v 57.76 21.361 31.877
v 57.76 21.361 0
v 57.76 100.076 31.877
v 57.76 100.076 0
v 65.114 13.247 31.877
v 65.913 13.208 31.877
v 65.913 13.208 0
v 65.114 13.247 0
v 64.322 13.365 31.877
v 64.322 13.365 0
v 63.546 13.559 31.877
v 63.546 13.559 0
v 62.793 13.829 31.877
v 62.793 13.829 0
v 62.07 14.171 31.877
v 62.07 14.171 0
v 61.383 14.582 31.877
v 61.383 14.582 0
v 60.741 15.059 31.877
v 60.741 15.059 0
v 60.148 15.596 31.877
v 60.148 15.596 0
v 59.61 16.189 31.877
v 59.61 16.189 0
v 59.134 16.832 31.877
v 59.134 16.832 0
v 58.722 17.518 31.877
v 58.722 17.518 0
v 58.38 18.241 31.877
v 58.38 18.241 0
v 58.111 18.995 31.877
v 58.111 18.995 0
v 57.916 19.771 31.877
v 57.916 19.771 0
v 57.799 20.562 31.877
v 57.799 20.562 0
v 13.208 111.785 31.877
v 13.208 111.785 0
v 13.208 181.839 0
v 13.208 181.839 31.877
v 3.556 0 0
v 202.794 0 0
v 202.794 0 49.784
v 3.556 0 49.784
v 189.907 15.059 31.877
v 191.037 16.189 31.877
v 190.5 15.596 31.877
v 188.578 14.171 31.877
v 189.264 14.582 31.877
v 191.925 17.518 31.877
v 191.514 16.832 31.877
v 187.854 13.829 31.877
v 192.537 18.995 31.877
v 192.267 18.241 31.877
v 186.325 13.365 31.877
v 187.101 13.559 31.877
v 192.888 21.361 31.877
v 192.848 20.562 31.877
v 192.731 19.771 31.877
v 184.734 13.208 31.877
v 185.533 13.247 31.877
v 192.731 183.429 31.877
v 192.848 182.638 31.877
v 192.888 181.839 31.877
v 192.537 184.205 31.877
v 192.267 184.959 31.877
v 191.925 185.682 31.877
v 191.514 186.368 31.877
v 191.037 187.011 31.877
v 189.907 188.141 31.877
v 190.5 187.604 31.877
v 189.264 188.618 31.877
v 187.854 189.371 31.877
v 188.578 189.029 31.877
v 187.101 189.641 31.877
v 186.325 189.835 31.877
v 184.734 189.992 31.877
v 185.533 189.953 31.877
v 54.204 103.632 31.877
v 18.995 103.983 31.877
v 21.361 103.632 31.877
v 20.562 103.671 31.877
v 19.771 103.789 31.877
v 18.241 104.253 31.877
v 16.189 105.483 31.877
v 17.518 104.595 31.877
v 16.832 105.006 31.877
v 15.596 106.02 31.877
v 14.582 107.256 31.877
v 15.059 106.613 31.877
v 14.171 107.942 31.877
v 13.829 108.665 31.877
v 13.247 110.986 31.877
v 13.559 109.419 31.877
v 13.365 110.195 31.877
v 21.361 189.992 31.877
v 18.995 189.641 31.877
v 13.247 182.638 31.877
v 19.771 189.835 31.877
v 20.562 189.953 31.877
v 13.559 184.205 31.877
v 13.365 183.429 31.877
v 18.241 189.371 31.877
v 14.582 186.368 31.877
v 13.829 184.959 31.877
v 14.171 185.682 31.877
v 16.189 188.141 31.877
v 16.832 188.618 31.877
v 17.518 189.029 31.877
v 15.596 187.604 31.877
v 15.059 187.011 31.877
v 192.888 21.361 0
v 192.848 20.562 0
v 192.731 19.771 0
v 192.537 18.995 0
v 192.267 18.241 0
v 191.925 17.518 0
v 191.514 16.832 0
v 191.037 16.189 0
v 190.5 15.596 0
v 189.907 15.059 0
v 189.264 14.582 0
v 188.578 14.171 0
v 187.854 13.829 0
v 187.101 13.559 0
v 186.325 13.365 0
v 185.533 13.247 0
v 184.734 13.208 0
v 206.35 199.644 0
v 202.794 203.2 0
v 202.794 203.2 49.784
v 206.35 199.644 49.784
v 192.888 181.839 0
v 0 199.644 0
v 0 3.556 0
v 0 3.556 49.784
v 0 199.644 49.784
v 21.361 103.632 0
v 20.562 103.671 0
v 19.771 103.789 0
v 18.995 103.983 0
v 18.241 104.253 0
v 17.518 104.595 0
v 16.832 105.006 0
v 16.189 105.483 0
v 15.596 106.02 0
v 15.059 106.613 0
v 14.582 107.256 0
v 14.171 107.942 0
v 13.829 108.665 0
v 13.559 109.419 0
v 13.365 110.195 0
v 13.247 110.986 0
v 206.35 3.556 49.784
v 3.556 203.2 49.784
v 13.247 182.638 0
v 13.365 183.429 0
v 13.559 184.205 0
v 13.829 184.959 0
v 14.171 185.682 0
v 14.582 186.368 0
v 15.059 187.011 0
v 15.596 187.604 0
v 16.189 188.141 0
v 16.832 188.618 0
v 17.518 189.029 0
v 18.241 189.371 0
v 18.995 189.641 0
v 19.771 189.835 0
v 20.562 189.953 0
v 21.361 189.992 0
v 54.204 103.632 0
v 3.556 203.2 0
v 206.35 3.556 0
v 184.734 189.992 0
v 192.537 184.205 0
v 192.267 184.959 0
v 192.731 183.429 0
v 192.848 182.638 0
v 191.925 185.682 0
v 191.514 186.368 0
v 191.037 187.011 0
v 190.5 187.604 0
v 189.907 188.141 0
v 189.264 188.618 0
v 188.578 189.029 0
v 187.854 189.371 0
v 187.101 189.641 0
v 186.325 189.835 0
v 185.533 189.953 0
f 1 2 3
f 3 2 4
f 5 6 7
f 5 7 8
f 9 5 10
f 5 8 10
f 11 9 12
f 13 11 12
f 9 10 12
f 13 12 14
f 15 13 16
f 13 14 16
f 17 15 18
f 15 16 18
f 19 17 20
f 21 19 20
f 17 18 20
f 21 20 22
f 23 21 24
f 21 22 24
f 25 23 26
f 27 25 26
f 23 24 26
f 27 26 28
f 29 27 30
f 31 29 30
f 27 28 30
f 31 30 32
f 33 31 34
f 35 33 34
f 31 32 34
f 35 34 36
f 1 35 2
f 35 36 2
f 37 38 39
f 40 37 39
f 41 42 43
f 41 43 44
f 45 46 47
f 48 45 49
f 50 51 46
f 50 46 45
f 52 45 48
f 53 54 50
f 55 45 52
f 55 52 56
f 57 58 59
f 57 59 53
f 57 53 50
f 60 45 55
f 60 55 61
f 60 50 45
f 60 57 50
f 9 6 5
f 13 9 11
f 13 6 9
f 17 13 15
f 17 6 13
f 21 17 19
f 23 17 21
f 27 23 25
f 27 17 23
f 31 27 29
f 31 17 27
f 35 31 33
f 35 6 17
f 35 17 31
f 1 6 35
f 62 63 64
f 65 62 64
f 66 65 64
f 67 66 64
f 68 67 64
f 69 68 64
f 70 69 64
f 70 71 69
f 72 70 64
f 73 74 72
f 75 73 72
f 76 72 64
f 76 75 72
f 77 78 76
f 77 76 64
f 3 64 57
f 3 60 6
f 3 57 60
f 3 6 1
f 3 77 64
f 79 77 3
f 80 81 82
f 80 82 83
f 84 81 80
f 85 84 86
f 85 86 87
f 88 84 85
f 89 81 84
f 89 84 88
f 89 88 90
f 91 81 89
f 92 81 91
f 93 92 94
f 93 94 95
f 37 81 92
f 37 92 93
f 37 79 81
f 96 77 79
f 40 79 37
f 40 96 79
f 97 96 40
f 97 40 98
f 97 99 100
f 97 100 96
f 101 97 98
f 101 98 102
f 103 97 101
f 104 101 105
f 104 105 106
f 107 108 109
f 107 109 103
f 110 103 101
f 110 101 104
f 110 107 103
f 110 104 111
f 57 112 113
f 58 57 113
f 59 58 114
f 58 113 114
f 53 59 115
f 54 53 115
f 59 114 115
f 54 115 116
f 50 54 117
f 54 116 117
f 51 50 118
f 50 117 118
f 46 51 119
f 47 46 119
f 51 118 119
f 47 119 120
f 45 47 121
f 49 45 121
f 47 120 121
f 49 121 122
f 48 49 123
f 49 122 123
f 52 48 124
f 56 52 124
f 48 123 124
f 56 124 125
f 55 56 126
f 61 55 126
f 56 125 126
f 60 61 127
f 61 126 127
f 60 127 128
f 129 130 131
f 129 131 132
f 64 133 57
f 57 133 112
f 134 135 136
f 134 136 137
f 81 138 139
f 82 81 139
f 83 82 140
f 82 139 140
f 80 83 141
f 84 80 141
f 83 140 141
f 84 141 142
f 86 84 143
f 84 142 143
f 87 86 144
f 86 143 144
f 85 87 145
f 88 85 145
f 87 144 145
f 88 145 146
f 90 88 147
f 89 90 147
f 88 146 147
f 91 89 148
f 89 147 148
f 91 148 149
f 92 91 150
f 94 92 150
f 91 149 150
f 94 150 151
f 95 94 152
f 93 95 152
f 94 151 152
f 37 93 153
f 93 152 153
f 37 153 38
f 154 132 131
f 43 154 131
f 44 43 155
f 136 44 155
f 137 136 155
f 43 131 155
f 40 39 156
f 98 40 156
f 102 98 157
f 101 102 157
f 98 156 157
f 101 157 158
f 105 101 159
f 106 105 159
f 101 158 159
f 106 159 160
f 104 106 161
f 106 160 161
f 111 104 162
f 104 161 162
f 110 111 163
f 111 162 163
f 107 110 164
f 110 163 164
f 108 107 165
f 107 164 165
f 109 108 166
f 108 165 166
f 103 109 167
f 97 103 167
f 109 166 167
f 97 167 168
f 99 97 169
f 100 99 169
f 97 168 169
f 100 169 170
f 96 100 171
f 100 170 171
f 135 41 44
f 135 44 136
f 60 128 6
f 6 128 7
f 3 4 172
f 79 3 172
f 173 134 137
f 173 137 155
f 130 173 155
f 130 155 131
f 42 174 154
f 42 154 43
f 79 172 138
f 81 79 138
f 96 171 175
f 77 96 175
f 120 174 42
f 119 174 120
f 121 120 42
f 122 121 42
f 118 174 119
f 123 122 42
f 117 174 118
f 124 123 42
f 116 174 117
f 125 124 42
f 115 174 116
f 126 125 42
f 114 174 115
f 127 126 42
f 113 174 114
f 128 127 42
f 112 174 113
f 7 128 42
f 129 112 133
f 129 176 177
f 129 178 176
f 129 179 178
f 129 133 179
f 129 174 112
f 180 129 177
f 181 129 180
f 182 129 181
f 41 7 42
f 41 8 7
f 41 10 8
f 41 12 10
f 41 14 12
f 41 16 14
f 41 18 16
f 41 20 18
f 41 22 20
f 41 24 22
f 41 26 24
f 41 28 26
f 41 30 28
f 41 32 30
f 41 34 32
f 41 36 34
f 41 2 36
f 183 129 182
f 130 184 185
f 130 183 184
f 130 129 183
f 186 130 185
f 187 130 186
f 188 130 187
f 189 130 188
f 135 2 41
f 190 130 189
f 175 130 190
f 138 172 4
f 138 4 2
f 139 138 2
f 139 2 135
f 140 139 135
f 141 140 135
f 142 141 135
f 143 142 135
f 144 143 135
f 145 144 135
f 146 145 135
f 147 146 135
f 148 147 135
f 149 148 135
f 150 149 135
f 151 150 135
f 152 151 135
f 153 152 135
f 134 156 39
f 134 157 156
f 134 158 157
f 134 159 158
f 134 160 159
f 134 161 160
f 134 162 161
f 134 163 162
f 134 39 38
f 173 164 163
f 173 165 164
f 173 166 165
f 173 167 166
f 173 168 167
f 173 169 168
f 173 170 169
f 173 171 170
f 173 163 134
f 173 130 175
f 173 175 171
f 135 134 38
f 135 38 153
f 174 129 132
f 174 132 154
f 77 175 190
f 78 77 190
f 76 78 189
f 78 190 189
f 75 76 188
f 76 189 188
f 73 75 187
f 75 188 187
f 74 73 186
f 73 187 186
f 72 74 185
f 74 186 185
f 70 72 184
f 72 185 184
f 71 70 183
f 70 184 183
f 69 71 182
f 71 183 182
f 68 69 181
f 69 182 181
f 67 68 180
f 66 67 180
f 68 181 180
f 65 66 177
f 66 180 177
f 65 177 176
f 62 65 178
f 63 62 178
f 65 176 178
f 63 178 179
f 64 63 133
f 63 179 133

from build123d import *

# Parameters (mm, degrees)
BOSS_EXTRUDE1_DEPTH = 49.784
CUT_EXTRUDE1_DEPTH  = 31.877


with BuildPart() as part:
    # Sketch1 → Boss-Extrude1 (new body)
    with BuildSketch(Plane.XY):
        Polygon((0, 199.644), (3.556, 203.2), (202.7936, 203.2), (206.3496, 199.644), (206.3496, 3.556), (202.7936, 0), (3.556, 0), (0, 3.556), align=None)
    extrude(amount=BOSS_EXTRUDE1_DEPTH)

    # Sketch2 → Cut-Extrude1 (cut)
    with BuildSketch(Plane(origin=(0, 0, 0), x_dir=(-1, 0, 0), z_dir=(0, 0, -1))):
        with BuildLine():
            Line((-192.8876, 181.8386), (-192.8876, 21.3614))
            ThreePointArc((-192.8876, 21.3614), (-190.49952443, 15.59607557), (-184.7342, 13.208))
            Line((-184.7342, 13.208), (-65.913, 13.208))
            ThreePointArc((-65.913, 13.208), (-60.14767557, 15.59607557), (-57.7596, 21.3614))
            Line((-57.7596, 21.3614), (-57.7596, 100.076))
            Line((-57.7596, 100.076), (-54.2036, 103.632))
            Line((-54.2036, 103.632), (-21.3614, 103.632))
            ThreePointArc((-21.3614, 103.632), (-15.59607557, 106.02007557), (-13.208, 111.7854))
            Line((-13.208, 111.7854), (-13.208, 181.8386))
            ThreePointArc((-13.208, 181.8386), (-15.59607557, 187.60392443), (-21.3614, 189.992))
            Line((-21.3614, 189.992), (-184.7342, 189.992))
            ThreePointArc((-184.7342, 189.992), (-190.49952443, 187.60392443), (-192.8876, 181.8386))
        make_face()
    extrude(amount=-CUT_EXTRUDE1_DEPTH, mode=Mode.SUBTRACT)


solid = part.part
